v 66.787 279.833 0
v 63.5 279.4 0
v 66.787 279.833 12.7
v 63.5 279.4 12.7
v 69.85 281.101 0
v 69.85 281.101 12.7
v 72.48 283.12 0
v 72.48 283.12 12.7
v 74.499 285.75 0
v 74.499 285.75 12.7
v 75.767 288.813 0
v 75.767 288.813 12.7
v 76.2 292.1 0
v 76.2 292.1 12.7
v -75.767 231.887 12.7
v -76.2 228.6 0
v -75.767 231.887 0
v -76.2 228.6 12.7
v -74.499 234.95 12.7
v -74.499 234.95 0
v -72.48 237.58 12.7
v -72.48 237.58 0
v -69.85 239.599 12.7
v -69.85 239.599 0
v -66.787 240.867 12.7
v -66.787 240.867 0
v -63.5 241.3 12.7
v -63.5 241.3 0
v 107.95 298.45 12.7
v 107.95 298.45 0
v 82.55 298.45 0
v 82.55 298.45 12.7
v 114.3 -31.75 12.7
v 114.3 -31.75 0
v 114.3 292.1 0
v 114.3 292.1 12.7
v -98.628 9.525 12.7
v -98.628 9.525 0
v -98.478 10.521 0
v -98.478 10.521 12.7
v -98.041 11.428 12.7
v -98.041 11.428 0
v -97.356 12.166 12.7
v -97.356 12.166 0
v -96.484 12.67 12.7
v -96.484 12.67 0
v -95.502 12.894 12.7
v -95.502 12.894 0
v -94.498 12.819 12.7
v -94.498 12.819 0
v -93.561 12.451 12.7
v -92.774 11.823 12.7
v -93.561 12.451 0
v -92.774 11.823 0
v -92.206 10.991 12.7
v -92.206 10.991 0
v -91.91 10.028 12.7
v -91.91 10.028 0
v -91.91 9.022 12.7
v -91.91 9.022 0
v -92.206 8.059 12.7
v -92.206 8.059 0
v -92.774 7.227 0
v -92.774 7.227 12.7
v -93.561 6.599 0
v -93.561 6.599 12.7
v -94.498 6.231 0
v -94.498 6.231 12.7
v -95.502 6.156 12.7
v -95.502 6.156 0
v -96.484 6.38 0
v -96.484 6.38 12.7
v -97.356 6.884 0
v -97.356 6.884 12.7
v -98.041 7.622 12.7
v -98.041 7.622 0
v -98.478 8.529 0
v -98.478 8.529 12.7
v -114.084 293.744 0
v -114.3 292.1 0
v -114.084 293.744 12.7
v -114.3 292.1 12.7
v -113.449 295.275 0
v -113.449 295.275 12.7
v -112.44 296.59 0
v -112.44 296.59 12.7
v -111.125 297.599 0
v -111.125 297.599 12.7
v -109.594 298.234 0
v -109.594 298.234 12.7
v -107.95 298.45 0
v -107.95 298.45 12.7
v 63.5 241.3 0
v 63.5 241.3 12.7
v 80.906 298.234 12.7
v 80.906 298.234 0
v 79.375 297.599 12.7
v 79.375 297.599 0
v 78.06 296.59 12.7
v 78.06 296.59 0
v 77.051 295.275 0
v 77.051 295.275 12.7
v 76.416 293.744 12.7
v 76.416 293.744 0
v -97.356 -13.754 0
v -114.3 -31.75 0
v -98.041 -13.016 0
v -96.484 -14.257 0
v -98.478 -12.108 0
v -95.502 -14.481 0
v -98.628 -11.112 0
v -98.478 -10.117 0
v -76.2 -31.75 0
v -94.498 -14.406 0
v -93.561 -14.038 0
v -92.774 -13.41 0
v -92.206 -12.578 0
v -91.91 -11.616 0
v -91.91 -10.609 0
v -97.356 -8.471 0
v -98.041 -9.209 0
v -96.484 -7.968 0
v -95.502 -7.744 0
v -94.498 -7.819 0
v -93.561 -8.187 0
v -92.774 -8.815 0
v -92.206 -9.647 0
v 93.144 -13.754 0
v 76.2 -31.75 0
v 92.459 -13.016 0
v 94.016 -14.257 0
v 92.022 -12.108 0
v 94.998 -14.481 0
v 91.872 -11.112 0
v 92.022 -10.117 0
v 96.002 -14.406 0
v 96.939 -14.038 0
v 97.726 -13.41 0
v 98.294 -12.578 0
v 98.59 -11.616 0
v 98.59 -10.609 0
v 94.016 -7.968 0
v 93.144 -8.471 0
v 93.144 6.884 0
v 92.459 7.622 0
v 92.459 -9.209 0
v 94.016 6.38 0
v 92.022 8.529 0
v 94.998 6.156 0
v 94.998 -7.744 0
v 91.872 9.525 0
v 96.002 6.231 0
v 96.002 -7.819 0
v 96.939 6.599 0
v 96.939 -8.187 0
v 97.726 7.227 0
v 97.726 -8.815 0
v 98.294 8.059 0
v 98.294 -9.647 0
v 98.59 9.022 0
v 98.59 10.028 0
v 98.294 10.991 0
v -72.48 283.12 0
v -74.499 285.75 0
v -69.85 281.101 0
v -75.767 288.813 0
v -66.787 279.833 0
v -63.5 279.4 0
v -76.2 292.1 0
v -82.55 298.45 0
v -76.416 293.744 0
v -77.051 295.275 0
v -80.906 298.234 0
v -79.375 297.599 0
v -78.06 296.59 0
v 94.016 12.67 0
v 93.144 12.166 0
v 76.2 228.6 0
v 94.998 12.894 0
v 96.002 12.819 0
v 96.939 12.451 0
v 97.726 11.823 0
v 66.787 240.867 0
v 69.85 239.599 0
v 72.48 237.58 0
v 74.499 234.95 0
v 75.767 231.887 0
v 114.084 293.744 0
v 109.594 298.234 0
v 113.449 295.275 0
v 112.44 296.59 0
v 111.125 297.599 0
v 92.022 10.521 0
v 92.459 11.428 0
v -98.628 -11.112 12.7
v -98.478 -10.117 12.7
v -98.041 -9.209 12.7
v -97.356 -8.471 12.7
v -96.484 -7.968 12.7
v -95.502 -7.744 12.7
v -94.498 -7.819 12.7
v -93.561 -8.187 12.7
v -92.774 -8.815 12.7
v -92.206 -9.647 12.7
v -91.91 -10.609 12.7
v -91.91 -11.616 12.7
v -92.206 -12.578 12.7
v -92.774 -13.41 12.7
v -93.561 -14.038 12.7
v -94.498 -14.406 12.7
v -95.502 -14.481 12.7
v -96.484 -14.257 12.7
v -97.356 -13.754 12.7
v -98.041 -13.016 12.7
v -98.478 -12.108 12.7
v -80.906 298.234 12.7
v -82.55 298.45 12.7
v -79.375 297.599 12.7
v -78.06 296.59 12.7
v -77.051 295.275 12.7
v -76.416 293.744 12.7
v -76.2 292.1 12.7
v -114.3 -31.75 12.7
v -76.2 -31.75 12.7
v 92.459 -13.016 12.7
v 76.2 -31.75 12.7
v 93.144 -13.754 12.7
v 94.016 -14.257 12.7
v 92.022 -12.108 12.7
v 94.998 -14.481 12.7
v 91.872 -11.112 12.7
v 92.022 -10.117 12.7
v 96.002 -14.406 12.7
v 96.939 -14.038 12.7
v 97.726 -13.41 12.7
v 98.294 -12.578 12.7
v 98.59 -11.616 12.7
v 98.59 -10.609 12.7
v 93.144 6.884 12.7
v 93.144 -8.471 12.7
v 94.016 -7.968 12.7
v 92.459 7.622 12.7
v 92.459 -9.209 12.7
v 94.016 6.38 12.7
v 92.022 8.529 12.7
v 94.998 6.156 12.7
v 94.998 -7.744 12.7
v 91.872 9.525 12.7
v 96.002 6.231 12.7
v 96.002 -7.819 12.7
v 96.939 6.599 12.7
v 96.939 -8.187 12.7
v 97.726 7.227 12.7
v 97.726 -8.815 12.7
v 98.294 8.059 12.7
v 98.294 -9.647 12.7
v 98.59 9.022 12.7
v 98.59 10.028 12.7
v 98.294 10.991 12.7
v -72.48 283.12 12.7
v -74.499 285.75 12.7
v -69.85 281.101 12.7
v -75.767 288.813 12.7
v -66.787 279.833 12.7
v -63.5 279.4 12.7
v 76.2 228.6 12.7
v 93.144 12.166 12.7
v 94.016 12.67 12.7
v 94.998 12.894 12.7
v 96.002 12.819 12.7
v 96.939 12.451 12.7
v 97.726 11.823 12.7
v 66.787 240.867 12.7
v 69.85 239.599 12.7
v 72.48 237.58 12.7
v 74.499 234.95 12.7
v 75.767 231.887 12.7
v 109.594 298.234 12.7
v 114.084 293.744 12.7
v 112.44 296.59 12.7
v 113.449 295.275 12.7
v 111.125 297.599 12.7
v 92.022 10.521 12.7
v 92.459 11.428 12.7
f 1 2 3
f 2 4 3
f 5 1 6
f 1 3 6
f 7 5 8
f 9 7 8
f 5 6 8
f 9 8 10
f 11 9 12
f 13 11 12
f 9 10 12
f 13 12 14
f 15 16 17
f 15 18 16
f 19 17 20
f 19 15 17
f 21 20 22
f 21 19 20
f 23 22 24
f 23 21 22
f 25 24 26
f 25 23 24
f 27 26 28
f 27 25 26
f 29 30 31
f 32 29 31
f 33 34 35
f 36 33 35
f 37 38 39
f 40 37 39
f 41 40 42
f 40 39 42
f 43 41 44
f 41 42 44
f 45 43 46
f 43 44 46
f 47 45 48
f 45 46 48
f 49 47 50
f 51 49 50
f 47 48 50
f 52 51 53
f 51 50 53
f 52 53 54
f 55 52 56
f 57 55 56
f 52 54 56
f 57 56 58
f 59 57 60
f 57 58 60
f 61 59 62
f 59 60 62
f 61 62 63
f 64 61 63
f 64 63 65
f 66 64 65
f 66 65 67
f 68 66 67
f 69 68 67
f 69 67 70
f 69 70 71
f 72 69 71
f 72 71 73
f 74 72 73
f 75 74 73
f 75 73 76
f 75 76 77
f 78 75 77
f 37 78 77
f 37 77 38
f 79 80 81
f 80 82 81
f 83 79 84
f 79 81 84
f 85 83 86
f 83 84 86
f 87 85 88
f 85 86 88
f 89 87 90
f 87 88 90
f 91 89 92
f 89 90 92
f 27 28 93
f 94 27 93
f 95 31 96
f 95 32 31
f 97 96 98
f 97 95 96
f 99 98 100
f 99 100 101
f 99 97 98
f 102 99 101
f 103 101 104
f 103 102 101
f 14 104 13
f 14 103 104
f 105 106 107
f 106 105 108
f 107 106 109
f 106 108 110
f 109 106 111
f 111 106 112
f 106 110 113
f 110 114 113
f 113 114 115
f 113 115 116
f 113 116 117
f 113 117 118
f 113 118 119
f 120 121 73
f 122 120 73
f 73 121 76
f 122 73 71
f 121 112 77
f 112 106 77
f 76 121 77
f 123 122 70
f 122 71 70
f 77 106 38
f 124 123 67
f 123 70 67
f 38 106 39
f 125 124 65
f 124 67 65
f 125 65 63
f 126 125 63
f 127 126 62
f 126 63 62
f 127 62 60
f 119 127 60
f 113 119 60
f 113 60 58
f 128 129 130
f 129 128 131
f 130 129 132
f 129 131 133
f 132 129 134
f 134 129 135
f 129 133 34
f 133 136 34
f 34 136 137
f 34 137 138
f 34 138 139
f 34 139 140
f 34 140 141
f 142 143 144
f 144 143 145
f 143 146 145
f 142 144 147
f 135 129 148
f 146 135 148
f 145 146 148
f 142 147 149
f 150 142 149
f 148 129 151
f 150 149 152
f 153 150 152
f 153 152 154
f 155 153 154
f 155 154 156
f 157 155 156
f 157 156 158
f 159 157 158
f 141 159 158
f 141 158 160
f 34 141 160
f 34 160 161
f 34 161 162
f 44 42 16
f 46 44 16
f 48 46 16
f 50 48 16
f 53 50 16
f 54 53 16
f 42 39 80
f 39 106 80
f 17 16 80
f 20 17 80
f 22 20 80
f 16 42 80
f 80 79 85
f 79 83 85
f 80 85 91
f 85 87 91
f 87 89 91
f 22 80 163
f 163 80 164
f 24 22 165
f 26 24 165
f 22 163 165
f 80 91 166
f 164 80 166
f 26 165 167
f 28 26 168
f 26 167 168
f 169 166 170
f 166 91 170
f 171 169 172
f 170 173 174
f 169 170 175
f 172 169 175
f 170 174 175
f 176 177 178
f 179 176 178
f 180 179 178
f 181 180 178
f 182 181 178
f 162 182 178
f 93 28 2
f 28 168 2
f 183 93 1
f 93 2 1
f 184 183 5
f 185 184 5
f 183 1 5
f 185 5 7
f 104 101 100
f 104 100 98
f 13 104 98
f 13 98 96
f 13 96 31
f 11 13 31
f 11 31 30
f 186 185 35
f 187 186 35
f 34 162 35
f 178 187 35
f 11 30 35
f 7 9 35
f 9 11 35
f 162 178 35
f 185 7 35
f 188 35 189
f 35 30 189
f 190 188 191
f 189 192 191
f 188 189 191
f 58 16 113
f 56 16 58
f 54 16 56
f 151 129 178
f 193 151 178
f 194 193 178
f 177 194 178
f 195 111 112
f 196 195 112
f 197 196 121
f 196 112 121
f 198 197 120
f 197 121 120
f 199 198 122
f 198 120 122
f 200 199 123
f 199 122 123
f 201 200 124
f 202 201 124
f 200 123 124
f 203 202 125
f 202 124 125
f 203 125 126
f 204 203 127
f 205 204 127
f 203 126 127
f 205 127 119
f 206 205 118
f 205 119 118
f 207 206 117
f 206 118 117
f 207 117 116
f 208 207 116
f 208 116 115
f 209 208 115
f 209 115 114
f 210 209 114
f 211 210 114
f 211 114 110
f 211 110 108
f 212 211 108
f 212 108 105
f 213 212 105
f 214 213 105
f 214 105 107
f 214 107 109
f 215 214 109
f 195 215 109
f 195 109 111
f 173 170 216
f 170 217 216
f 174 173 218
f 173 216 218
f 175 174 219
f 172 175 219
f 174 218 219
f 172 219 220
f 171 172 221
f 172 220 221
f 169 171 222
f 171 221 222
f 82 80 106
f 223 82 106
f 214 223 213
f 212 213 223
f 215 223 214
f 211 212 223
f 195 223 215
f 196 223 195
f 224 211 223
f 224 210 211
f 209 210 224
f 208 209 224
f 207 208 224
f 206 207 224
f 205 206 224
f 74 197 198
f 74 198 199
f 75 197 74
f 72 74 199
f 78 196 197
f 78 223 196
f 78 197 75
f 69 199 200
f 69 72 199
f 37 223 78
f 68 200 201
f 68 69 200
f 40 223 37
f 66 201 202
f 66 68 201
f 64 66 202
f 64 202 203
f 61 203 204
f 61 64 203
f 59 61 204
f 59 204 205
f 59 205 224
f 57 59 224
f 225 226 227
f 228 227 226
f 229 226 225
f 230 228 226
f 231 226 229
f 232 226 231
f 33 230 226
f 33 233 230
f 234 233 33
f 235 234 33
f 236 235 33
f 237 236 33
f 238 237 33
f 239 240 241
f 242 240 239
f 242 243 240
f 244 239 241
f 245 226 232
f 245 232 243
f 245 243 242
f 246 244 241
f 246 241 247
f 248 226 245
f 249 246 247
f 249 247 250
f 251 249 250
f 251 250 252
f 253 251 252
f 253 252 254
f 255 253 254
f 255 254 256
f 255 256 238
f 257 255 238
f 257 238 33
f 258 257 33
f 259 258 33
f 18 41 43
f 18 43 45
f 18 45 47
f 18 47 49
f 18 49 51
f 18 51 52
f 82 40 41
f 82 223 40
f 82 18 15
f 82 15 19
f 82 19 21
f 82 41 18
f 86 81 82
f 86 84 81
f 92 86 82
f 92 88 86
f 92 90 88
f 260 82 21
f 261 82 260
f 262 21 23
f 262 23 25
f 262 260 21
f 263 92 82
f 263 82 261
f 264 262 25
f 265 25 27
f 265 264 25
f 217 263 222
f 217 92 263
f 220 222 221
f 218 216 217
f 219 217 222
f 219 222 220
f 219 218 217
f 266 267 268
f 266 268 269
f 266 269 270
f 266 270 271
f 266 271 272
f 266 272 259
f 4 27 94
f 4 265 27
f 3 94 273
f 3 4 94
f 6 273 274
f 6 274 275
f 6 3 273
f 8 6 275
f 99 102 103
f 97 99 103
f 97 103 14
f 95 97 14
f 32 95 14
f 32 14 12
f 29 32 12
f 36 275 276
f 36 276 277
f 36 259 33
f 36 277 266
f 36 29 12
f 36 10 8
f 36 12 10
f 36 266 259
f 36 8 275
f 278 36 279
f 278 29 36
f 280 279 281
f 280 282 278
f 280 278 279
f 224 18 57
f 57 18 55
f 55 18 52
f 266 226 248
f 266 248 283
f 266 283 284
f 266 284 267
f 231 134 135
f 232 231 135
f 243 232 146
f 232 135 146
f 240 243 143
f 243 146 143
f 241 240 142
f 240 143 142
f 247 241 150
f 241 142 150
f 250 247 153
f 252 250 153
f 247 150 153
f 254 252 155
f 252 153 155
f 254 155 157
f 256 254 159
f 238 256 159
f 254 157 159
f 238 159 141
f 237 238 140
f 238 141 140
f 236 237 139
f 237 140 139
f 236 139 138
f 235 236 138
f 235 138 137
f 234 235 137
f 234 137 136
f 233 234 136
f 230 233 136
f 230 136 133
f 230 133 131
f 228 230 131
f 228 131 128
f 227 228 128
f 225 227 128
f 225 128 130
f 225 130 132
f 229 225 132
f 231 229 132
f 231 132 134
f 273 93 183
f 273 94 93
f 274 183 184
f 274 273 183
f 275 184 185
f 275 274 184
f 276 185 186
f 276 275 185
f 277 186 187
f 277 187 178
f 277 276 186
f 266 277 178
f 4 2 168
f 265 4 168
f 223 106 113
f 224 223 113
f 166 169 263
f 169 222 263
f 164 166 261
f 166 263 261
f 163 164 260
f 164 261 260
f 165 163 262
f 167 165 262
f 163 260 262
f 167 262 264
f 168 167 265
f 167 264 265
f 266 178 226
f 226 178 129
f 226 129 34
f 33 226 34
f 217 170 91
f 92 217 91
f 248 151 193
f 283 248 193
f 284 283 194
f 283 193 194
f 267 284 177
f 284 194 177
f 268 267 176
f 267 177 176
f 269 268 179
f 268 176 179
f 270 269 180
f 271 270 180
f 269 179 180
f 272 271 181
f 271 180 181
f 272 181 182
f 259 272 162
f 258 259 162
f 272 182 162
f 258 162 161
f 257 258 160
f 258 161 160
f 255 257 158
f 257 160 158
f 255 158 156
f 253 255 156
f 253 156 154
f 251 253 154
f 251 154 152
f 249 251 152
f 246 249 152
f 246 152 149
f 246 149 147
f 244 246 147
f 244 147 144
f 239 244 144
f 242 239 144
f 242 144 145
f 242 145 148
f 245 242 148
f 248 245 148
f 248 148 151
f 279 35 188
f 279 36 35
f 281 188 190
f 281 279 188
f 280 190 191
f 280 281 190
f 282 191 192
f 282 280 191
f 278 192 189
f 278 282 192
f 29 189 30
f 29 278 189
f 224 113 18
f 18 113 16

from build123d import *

# Parameters (mm, degrees)
BOSS_EXTRUDE1_DEPTH         = 12.7
F_1_4_CLEARANCE_HOLE1_D     = 6.7564
F_1_4_CLEARANCE_HOLE1_DEPTH = 219.964
F_1_4_CLEARANCE_HOLE1_TIP   = 2.029827343
FILLET1_R                   = 12.7
FILLET2_R                   = 6.35


with BuildPart() as part:
    # Sketch1 → Boss-Extrude1 (new body)
    with BuildSketch(Plane.XY):
        Polygon((-114.3, -31.75), (-76.2, -31.75), (-76.2, 241.3), (76.2, 241.3), (76.2, -31.75), (114.3, -31.75), (114.3, 298.45), (76.2, 298.45), (76.2, 279.4), (-76.2, 279.4), (-76.2, 298.45), (-114.3, 298.45), align=None)
    extrude(amount=BOSS_EXTRUDE1_DEPTH)

    # 1/4 Clearance Hole1
    with Locations(Plane.XY.offset(12.7)):
        with Locations((-95.25, -11.1125), (-95.25, 9.525), (95.25, -11.1125), (95.25, 9.525)):
            Hole(F_1_4_CLEARANCE_HOLE1_D / 2, depth=F_1_4_CLEARANCE_HOLE1_DEPTH)
            with Locations((0, 0, -(F_1_4_CLEARANCE_HOLE1_DEPTH + F_1_4_CLEARANCE_HOLE1_TIP / 2))):  # 118° drill point
                Cone(0, F_1_4_CLEARANCE_HOLE1_D / 2, F_1_4_CLEARANCE_HOLE1_TIP, mode=Mode.SUBTRACT)

    # Fillet1
    fillet1_edges = [part.edges().sort_by_distance(p)[0] for p in [
        (-76.2, 279.4, 6.35),
        (76.2, 279.4, 6.35),
        (76.2, 241.3, 6.35),
        (-76.2, 241.3, 6.35),
    ]]
    fillet(fillet1_edges, radius=FILLET1_R)

    # Fillet2
    fillet2_edges = [part.edges().sort_by_distance(p)[0] for p in [
        (114.3, 298.45, 6.35),
        (76.2, 298.45, 6.35),
        (-114.3, 298.45, 6.35),
        (-76.2, 298.45, 6.35),
    ]]
    fillet(fillet2_edges, radius=FILLET2_R - 0.0001)  # a hair under: the kernel refuses the full size


solid = part.part
